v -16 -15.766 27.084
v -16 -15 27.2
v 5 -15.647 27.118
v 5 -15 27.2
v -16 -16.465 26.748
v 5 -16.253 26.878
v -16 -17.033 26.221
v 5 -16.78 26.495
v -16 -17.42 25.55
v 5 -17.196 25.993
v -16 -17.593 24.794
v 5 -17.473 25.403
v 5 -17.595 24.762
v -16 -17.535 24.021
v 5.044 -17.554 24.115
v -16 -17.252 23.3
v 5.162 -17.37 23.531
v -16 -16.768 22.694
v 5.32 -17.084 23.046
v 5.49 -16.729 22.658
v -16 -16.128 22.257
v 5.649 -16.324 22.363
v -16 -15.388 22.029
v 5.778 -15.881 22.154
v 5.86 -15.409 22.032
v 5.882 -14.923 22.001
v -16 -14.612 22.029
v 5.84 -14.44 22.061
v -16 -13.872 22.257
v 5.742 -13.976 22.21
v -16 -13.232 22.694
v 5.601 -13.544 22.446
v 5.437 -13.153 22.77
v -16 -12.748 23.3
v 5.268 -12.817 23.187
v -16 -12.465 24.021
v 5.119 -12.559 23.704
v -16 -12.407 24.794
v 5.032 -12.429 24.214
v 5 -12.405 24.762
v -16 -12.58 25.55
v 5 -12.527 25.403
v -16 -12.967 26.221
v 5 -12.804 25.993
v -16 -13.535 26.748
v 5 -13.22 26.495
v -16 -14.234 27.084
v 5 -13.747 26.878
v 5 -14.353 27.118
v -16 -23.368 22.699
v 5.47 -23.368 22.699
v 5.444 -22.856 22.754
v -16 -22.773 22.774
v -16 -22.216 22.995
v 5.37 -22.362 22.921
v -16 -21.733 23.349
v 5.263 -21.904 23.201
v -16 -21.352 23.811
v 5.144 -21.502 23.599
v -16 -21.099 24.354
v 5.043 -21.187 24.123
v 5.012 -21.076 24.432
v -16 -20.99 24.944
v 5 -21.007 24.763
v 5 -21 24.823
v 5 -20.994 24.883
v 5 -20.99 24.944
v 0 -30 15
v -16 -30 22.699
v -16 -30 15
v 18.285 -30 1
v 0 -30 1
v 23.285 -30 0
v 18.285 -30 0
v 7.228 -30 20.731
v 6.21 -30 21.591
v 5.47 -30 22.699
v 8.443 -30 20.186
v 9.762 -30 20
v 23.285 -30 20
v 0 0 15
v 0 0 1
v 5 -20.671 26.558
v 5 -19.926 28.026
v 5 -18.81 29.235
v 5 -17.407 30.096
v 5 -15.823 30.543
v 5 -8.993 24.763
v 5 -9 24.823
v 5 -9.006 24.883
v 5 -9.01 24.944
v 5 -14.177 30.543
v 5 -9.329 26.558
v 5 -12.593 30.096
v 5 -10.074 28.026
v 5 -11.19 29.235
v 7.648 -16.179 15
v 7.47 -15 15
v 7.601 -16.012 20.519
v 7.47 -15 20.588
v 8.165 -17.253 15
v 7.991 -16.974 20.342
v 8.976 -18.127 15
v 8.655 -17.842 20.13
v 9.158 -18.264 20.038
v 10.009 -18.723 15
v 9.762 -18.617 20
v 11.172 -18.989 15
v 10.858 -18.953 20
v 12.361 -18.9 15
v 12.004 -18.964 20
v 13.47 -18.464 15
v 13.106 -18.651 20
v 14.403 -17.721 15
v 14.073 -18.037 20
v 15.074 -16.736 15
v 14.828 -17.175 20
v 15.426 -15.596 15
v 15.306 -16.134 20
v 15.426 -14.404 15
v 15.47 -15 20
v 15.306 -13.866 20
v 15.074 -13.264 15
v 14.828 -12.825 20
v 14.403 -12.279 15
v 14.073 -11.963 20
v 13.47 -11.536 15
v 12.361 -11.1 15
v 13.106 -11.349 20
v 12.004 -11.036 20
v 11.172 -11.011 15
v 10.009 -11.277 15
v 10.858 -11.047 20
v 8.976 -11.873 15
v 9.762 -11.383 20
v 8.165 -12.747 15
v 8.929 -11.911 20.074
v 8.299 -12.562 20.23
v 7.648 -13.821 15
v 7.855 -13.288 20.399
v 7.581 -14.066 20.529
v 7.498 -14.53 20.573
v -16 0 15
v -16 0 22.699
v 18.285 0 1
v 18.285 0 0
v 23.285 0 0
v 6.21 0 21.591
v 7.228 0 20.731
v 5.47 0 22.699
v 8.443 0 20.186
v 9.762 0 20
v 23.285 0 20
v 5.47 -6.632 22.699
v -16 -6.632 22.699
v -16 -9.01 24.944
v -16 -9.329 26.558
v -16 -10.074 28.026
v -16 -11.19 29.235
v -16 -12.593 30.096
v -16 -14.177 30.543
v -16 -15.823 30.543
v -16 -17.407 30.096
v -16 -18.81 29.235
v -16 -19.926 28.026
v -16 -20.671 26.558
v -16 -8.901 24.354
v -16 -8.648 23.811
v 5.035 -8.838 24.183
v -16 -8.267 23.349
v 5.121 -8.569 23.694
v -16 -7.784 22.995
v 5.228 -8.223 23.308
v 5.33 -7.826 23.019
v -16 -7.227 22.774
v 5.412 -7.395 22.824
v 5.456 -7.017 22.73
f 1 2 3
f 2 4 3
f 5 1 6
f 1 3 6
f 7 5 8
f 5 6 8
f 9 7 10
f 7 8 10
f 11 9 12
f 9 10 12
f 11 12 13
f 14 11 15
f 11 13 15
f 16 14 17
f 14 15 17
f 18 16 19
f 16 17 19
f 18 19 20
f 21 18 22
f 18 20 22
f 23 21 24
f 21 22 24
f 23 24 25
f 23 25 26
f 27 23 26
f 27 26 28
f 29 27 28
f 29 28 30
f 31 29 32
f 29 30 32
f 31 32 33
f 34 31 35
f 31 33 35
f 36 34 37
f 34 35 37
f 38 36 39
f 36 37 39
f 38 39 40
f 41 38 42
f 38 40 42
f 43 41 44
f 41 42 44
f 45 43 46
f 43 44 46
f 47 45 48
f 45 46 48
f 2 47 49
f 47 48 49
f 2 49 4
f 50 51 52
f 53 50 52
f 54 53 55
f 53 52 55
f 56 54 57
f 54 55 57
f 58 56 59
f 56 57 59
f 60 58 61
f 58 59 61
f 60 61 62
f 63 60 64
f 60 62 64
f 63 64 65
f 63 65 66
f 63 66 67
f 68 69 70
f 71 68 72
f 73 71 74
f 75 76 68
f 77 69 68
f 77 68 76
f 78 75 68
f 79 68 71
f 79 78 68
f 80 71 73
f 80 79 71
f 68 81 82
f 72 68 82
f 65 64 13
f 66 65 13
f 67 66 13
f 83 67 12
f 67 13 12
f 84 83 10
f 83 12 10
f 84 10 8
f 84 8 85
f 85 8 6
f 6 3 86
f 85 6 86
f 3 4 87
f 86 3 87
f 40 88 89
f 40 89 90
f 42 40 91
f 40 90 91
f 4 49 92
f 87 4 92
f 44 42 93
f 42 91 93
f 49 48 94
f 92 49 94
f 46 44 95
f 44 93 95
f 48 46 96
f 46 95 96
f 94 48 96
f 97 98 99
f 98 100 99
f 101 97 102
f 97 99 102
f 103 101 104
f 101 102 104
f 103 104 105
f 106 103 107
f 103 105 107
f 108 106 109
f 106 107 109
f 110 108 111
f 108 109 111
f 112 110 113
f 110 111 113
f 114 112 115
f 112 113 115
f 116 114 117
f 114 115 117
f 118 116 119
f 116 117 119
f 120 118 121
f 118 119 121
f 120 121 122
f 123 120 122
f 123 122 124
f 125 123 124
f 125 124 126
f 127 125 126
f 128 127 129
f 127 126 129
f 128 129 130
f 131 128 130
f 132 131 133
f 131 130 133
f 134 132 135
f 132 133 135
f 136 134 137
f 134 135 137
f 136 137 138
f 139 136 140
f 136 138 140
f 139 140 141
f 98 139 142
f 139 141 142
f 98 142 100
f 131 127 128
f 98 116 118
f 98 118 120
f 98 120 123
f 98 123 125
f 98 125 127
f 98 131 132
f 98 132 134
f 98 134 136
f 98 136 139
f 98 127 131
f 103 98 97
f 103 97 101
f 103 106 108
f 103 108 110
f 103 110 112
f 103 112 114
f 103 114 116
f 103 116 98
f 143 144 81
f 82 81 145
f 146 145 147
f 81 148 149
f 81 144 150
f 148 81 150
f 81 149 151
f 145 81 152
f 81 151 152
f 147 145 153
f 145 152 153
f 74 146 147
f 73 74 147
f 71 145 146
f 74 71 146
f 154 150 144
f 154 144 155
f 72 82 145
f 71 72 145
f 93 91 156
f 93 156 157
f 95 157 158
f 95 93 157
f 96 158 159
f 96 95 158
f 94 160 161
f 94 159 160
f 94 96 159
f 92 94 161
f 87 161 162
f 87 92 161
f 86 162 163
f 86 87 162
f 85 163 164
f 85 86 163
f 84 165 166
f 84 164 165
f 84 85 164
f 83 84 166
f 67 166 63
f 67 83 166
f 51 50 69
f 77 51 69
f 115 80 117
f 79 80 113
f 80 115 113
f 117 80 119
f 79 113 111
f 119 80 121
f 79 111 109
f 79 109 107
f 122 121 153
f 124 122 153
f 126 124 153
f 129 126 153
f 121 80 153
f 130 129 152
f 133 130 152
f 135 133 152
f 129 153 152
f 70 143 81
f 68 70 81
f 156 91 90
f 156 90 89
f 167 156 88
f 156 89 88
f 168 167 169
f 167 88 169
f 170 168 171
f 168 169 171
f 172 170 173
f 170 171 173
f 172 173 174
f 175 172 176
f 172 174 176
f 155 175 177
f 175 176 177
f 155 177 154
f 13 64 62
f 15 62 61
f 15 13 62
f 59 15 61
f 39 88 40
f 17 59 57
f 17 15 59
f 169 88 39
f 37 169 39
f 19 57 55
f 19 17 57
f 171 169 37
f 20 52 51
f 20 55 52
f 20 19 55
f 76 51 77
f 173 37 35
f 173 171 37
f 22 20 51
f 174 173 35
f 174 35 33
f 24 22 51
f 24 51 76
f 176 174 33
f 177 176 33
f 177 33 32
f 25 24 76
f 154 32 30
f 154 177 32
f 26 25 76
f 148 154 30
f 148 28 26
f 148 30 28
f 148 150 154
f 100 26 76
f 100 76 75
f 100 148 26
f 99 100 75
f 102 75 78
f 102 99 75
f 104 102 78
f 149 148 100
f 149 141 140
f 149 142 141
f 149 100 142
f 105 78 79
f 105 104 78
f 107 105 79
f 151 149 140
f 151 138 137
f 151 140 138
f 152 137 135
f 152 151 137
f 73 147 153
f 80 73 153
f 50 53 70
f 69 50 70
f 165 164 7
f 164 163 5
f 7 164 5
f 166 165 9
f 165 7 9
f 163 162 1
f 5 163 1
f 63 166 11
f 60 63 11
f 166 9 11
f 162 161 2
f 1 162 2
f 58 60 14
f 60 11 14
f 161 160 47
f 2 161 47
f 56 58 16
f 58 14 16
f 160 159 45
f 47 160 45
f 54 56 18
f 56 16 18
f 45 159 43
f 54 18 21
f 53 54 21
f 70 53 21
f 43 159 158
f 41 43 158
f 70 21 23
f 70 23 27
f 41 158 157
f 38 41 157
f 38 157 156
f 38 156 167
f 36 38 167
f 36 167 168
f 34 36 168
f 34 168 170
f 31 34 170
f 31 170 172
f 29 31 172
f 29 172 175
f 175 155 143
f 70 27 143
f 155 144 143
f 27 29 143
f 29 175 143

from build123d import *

# Parameters (mm, degrees)
PAD003_DEPTH         = 30
POCKET001_DEPTH      = 21.001
POCKET001_DEPTH_BACK = 18.286158
SKETCH010_R          = 2.6
POCKET002_DEPTH      = 21.001
POCKET002_DEPTH_BACK = 18.286158
SKETCH011_R          = 4
POCKET003_DEPTH      = 5
POCKET003_DEPTH_BACK = 100


with BuildPart() as part:
    # Sketch008 → Pad003 (new body)
    with BuildSketch(Plane.XZ):
        with BuildLine():
            Line((-16, 15), (0, 15))
            Line((0, 15), (0, 1))
            Line((0, 1), (18.285158, 1))
            Line((18.285158, 1), (18.285158, 0))
            Line((18.285158, 0), (23.285158, 0))
            Line((23.285158, 0), (23.285158, 20))
            Line((23.285158, 20), (9.7625, 20))
            ThreePointArc((5, 24.7625), (6.394904, 21.394904), (9.7625, 20))
            Line((5, 24.7625), (5, 30.6))
            Line((5, 30.6), (-16, 30.6))
            Line((-16, 30.6), (-16, 15))
        make_face()
    extrude(amount=PAD003_DEPTH)

    # Sketch009 (on Face1 of Pad003) → Pocket001 (cut, two sides)
    with BuildSketch(Plane(origin=(5, 0, 0), x_dir=(0, 0, 1), z_dir=(1, 0, 0))) as pocket001_sk:
        with BuildLine():
            ThreePointArc((24.943511, 9.009841), (30.6, 15), (24.943511, 20.990159))
            ThreePointArc((22.698592, 23.367503), (23.348515, 21.732615), (24.943511, 20.990159))
            Line((22.698592, 23.367503), (22.698592, 35))
            Line((22.698592, 35), (35.6, 35))
            Line((35.6, 35), (35.6, -5))
            Line((35.6, -5), (22.698592, -5))
            Line((22.698592, -5), (22.698592, 6.632497))
            ThreePointArc((24.943511, 9.009841), (23.348515, 8.267384), (22.698592, 6.632497))
        make_face()
    extrude(amount=-POCKET001_DEPTH, mode=Mode.SUBTRACT)
    extrude(pocket001_sk.sketch, amount=POCKET001_DEPTH_BACK, mode=Mode.SUBTRACT)

    # Sketch010 (on Face1 of Pocket001) → Pocket002 (cut, two sides)
    with BuildSketch(Plane(origin=(5, 0, 0), x_dir=(0, 0, 1), z_dir=(1, 0, 0))) as pocket002_sk:
        with Locations((24.6, 15)):
            Circle(SKETCH010_R)
    extrude(amount=-POCKET002_DEPTH, mode=Mode.SUBTRACT)
    extrude(pocket002_sk.sketch, amount=POCKET002_DEPTH_BACK, mode=Mode.SUBTRACT)

    # Sketch011 (on Face12 of Pocket002) → Pocket003 (cut, two sides)
    with BuildSketch(Plane(origin=(0, 0, 20), x_dir=(-1, 0, 0), z_dir=(0, 0, 1))) as pocket003_sk:
        with Locations((-11.47045, 15)):
            Circle(SKETCH011_R)
    extrude(amount=-POCKET003_DEPTH, mode=Mode.SUBTRACT)
    extrude(pocket003_sk.sketch, amount=POCKET003_DEPTH_BACK, mode=Mode.SUBTRACT)


solid = part.part
